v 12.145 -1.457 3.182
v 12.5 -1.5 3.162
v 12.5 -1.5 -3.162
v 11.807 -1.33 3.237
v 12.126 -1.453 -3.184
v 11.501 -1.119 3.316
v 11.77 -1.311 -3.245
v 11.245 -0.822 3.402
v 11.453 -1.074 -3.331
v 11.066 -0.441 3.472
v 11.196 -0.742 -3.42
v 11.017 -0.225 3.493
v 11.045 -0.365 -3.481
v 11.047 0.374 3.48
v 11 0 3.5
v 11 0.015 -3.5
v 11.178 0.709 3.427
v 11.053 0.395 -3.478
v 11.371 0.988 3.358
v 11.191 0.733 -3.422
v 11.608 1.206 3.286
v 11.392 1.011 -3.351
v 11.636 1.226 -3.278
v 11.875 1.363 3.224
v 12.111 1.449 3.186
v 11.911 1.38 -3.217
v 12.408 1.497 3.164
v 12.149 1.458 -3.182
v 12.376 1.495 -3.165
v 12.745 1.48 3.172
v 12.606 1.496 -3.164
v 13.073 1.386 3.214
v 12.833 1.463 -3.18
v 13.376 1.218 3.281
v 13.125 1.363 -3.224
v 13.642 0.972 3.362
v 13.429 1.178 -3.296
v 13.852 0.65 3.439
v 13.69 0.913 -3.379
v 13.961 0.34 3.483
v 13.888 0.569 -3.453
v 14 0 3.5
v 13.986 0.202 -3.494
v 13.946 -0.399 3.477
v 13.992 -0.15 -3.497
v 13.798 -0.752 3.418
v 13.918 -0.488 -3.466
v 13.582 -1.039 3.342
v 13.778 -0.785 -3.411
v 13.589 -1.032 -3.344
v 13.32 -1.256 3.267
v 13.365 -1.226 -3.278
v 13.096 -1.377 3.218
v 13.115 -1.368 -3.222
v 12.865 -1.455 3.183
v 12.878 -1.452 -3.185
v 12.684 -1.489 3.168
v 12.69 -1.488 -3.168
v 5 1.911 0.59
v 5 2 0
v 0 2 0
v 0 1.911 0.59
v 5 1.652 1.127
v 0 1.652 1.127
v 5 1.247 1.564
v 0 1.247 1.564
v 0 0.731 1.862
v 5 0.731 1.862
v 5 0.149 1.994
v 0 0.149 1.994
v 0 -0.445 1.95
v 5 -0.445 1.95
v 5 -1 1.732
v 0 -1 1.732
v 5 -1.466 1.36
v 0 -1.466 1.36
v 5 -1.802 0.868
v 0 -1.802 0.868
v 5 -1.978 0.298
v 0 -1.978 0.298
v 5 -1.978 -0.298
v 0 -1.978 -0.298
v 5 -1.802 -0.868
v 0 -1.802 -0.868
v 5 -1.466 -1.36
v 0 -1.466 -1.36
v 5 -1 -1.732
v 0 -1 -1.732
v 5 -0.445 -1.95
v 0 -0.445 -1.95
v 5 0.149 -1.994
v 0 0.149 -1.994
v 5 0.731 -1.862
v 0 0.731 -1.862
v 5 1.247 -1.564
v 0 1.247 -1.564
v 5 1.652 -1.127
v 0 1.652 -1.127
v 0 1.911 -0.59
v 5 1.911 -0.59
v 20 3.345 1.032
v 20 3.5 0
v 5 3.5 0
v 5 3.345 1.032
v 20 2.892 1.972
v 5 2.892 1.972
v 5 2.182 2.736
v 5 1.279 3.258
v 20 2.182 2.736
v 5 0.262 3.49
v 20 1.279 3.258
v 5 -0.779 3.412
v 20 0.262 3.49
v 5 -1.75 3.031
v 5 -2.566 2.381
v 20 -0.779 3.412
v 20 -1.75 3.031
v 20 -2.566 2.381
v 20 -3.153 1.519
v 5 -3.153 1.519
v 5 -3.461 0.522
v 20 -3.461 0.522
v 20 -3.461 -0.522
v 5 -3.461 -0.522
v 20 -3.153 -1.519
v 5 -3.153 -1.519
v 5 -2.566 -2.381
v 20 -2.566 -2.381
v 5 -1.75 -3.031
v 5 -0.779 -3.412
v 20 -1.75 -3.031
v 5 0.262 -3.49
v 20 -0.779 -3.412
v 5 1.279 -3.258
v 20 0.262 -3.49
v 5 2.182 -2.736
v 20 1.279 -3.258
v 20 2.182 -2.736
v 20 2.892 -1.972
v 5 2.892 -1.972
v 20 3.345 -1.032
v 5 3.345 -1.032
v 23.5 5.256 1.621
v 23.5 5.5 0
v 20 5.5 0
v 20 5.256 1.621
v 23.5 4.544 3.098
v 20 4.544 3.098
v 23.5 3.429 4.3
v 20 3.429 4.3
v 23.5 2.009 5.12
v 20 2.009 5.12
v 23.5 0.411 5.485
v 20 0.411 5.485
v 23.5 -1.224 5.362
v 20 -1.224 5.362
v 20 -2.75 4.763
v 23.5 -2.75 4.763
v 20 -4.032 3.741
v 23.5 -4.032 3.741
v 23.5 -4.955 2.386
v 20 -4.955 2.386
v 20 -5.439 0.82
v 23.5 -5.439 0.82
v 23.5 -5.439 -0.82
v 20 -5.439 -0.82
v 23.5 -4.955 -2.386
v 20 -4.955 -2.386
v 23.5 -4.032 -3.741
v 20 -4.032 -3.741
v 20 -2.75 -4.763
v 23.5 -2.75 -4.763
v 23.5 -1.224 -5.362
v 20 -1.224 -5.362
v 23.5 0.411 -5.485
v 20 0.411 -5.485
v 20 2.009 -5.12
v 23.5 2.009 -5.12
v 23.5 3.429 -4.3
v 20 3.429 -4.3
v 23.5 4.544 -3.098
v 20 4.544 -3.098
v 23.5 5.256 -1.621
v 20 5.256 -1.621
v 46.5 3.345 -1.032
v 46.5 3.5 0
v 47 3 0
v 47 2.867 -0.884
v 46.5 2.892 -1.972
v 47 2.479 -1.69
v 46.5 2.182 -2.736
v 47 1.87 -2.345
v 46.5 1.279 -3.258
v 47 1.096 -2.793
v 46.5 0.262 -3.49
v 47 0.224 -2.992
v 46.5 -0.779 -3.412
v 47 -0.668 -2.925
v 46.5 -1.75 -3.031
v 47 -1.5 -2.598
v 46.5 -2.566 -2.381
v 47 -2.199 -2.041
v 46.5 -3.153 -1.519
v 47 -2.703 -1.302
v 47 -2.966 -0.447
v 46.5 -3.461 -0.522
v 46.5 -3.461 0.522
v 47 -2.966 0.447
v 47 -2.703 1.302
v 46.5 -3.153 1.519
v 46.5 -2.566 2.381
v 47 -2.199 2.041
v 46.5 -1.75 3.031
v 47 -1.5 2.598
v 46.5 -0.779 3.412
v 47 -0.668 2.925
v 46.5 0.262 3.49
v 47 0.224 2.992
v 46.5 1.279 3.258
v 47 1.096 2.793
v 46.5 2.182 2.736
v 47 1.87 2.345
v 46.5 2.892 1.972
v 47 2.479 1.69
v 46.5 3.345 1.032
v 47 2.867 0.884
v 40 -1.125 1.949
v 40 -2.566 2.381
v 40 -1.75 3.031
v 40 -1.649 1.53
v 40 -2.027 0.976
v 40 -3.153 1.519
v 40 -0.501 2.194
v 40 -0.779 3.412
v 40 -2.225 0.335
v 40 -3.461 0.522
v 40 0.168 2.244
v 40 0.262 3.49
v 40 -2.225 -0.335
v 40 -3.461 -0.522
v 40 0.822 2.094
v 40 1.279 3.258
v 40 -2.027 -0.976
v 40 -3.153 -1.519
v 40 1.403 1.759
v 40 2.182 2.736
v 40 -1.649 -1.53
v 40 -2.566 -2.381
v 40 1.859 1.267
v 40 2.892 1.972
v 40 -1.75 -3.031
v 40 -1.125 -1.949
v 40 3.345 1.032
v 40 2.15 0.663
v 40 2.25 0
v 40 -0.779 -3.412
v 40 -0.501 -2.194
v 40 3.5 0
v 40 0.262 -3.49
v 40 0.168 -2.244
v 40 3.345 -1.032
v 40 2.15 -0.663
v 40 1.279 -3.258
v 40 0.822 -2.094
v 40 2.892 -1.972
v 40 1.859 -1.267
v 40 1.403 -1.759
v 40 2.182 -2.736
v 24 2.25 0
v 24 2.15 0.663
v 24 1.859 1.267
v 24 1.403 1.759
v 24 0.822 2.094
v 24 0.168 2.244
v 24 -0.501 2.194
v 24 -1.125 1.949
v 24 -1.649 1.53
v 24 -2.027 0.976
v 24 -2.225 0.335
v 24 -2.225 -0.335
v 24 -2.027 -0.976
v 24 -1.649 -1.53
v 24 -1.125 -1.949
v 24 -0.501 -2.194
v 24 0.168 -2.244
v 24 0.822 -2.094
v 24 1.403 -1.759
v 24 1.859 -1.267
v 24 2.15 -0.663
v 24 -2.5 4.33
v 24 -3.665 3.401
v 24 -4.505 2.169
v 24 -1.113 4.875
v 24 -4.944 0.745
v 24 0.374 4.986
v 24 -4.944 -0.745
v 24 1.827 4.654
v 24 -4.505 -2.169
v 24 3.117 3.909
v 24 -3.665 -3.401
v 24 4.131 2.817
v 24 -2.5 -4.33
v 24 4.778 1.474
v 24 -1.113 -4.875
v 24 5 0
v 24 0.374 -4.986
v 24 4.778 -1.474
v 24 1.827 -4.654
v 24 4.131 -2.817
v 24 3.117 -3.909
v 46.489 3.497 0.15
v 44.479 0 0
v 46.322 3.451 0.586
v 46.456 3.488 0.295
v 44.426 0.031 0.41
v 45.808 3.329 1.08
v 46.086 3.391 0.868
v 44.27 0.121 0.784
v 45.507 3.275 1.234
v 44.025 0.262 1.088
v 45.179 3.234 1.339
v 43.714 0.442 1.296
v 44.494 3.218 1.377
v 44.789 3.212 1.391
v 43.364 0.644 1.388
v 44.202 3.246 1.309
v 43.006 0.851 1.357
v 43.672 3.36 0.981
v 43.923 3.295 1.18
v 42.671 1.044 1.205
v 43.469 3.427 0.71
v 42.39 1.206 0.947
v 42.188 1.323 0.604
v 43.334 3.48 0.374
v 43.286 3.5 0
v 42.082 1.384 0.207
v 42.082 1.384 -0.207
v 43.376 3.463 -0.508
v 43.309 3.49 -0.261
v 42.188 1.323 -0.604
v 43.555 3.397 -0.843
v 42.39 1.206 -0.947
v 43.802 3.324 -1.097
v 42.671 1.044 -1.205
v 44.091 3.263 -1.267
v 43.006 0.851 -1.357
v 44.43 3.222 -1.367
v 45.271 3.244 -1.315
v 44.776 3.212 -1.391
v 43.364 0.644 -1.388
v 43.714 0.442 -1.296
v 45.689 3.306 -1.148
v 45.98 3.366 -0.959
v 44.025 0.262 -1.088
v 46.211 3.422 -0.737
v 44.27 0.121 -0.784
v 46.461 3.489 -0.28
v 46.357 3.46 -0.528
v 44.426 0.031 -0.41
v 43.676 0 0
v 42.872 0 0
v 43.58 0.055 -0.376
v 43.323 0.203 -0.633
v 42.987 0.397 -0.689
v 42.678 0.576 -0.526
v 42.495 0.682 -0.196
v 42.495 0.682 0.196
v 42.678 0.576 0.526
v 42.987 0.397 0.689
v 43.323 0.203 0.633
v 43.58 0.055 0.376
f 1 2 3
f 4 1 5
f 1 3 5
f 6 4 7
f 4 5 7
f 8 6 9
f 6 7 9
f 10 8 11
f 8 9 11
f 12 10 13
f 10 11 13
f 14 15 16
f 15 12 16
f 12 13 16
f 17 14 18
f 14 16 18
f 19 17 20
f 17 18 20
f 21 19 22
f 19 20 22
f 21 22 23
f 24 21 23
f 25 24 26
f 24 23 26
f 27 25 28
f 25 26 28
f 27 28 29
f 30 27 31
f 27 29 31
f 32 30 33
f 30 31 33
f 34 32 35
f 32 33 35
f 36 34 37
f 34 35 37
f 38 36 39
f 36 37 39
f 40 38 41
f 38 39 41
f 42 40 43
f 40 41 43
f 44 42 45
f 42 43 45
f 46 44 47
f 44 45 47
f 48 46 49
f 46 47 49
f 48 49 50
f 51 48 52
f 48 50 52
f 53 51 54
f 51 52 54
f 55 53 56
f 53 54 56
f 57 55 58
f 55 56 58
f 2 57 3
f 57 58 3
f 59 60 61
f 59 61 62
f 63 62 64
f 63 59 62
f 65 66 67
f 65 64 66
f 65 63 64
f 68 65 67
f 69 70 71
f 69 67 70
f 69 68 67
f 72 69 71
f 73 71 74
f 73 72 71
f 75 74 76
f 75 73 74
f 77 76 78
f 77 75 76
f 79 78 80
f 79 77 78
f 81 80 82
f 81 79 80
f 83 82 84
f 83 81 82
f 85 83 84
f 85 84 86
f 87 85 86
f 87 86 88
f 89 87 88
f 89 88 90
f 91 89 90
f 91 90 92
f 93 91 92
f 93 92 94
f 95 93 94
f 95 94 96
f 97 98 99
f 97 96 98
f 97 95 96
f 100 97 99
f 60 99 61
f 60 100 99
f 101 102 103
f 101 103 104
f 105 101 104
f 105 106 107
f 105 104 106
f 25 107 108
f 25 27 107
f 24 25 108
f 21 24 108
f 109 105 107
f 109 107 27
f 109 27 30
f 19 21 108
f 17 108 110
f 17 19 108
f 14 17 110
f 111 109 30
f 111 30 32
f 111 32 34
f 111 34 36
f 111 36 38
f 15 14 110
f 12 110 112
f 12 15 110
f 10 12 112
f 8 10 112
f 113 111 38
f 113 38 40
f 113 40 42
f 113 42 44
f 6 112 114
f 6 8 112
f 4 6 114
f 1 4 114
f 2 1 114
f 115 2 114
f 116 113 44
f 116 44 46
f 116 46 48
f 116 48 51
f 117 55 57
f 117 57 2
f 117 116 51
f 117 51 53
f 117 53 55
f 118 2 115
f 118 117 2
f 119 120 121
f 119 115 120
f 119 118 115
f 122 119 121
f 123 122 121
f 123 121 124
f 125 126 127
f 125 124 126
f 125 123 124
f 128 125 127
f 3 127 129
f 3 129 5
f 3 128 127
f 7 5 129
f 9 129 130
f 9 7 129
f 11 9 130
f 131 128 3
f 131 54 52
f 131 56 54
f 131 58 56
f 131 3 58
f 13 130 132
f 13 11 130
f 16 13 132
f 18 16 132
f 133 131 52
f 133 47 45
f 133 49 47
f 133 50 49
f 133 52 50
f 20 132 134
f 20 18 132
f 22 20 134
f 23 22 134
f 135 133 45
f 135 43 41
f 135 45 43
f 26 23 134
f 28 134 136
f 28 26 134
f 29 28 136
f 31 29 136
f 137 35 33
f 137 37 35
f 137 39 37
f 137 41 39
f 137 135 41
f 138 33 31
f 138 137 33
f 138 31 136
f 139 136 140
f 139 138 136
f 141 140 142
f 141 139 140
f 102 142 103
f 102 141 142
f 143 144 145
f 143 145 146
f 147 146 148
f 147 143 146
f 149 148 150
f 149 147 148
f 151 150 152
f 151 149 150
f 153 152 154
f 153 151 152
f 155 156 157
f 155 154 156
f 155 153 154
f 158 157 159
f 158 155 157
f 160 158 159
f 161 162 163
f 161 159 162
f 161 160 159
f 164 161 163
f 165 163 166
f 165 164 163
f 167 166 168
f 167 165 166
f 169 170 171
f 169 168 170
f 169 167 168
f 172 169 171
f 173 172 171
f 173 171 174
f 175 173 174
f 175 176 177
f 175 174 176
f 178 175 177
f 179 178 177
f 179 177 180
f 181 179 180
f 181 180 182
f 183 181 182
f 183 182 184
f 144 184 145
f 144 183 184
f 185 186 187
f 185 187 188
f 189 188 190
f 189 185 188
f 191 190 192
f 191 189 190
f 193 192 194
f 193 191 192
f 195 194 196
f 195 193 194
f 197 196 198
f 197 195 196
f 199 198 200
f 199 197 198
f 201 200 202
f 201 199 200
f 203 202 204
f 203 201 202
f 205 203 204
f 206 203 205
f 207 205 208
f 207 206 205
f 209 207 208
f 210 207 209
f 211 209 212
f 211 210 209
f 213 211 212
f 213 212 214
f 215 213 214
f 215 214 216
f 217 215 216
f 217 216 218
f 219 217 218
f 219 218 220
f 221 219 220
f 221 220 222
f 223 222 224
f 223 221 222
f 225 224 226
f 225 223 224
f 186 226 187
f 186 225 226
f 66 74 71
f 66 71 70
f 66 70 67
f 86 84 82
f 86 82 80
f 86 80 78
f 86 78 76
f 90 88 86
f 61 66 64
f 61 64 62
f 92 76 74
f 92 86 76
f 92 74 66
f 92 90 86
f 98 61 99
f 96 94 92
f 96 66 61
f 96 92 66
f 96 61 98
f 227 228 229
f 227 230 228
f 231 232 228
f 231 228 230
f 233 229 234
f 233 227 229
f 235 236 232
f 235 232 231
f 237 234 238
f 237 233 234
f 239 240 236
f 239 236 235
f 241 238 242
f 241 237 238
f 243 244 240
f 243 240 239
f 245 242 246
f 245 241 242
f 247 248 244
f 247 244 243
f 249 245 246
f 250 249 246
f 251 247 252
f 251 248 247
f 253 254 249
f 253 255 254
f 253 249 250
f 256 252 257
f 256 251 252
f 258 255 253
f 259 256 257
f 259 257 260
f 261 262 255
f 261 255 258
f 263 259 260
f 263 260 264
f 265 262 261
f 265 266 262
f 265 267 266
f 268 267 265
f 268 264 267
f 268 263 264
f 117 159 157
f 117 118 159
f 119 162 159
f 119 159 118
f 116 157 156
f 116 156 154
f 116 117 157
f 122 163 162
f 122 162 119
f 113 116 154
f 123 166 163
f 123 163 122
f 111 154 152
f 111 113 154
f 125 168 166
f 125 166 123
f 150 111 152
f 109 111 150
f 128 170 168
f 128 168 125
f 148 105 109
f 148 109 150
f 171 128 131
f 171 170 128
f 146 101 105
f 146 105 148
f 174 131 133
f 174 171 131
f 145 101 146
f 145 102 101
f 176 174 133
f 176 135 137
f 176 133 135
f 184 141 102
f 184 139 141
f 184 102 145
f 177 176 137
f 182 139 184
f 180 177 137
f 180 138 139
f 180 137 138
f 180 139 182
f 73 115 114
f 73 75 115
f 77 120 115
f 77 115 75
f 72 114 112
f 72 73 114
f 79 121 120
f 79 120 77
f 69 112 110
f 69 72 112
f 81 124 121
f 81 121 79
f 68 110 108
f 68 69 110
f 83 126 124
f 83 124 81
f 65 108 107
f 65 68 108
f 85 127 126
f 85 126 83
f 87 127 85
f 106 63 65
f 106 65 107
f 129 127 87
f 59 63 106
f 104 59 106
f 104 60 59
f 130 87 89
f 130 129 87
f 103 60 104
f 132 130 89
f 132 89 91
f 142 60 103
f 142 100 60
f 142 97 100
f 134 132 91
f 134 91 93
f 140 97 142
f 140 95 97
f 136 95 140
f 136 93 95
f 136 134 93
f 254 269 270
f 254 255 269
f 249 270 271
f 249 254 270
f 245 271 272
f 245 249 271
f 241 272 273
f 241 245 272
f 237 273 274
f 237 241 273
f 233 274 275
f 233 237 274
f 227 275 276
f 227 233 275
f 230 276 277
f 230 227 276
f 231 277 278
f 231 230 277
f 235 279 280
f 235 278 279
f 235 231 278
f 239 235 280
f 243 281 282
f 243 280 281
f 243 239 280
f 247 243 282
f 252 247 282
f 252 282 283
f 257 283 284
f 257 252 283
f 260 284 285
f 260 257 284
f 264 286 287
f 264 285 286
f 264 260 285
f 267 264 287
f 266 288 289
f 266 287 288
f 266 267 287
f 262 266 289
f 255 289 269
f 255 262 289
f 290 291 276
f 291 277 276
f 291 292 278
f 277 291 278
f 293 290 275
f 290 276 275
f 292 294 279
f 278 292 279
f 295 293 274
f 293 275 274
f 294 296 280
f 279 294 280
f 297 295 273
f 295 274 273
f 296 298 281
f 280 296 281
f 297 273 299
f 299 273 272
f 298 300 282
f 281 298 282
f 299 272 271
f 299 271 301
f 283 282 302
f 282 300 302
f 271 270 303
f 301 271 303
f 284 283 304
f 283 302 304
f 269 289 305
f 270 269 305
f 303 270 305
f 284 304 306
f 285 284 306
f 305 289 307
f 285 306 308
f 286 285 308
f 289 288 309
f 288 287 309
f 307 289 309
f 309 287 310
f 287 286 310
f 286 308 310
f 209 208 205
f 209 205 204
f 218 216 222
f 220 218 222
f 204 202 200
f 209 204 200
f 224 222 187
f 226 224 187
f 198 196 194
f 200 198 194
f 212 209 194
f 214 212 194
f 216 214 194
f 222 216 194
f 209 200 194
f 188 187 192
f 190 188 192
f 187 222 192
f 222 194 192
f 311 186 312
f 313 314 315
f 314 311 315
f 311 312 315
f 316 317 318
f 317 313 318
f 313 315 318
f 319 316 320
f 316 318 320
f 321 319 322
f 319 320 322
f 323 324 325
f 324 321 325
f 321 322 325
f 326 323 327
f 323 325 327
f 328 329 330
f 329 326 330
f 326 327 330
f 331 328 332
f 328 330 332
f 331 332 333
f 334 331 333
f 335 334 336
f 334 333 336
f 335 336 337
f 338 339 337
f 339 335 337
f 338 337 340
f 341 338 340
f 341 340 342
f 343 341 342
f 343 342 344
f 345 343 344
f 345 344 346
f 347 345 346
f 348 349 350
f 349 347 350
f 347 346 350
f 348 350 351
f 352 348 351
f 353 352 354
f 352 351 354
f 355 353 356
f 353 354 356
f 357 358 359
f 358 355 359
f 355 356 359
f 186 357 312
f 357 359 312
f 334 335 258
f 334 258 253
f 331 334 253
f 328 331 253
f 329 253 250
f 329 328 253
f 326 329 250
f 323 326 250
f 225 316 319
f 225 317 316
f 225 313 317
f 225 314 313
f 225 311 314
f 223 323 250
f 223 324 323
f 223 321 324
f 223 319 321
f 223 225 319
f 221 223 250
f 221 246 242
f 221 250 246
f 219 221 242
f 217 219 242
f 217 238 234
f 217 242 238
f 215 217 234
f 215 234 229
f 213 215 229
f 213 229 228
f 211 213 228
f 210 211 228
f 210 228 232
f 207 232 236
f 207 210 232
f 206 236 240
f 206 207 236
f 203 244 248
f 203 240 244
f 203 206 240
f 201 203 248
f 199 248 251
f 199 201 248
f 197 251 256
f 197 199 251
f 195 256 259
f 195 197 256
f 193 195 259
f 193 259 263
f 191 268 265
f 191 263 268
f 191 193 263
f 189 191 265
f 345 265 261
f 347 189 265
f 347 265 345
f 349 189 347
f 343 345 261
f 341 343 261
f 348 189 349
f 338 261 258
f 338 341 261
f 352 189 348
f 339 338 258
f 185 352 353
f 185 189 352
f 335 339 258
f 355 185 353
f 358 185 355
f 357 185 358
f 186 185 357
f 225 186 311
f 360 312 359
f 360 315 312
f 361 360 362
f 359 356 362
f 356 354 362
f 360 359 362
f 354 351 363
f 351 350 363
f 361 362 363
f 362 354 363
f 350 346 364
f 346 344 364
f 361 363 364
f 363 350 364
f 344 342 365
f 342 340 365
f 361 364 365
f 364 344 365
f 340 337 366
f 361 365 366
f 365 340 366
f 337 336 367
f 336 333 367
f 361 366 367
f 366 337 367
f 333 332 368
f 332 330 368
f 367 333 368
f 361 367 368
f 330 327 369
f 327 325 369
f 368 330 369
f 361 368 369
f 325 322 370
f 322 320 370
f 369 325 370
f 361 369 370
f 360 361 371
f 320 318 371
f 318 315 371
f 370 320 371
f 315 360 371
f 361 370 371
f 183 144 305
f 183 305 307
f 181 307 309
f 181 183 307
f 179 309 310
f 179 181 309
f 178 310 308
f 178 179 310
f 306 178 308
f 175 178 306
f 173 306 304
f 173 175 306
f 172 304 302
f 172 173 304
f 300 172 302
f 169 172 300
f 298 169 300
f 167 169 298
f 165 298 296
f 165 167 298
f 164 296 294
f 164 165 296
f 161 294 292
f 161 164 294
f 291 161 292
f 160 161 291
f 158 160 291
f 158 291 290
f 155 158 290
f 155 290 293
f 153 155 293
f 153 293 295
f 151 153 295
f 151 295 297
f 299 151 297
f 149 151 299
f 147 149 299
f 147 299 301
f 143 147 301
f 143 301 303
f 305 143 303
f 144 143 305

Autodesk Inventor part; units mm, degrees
ref_plane "YZ Plane" through (0, 0, 0) normal (1, 0, 0) x (0, 1, 0)
ref_plane "XZ Plane" through (0, 0, 0) normal (0, 1, 0) x (-1, 0, 0)
sketch "Sketch1" plane through (0, 0, 0) normal (0, 0, 1) x (1, 0, 0)
  line L0 (0, 0) -> (0, 2)
  line L1 (0, 2) -> (5, 2)
  line L2 (5, 2) -> (5, 3.5)
  line L3 (5, 3.5) -> (20, 3.5)
  line L4 (20, 3.5) -> (20, 5.5)
  line L5 (20, 5.5) -> (21.4643, 5.5)
  line L6 (21.4643, 5.5) -> (21.4643, 5.5)
  line L7 (21.4643, 5.5) -> (24, 5.5)
  line L8 (24, 5.5) -> (24, 2.25)
  line L9 (24, 2.25) -> (40, 2.25)
  line L10 (40, 2.25) -> (40, 3.5)
  line L11 (40, 3.5) -> (47, 3.5)
  line L12 (47, 3.5) -> (47, 0)
  line L13 (47, 0) -> (0, 0)
  dimension "d0" = 4
  dimension "d1" = 7
  dimension "d2" = 5
  dimension "d3" = 15
  dimension "d4" = 47
  dimension "d5" = 7
  dimension "d6" = 16
  dimension "d7" = 4.5
  dimension "d8" = 4
  dimension "d10" = 11
revolve "Revolution1" add sketch "Sketch1" angle 360 about axis through (47, 0, 0) along (-1, 0, 0)
thread "Thread1" size "M4x0.7" class "6g" standard "ISO Metric profile" length 10
chamfer "Chamfer1" distance 0.5 angle 45 2 edges at (24, -5.5, 0) (47, -3.5, 0)
ref_plane "Work Plane1" through (0, 0, 3.5) normal (0, 0, 1) x (1, 0, 0)
sketch "Sketch2" plane through (0, 0, 3.5) normal (0, 0, 1) x (1, 0, 0)
  line L0 (5, 3.5) -> (5, -3.5) projected
  point P0 (0, 0)
  point P1 (12.5, 0)
  dimension "d18" = 7.5
hole "Hole1" at (12.5, 0, 3.5) direction (0, 0, -1) diameter 3 end through all
sketch "Sketch4" plane through (0, 0, 0) normal (0, 0, 1) x (1, 0, 0)
  line L0 (44.893, 3.5) -> (42.8722, 0)
  line L1 (46.5, 3.5) -> (44.893, 3.5)
  line L2 (47, 3) -> (47, -3) projected
  line L3 (46.5, 3.5) -> (40, 3.5) projected
  line L4 (46.5, -3.5) -> (46.5, 3.5) projected
  line L5 (46.5, 3.5) -> (44.4793, 0)
  line L6 (44.4793, 0) -> (42.8722, 0)
  point P0 (0, 0)
  point P1 (44.4443, 0)
  point P2 (47, 0)
  point P3 (46.5, 0)
  dimension "d38" = 30
revolve "Revolution3" cut sketch "Sketch4" angle 360 about axis through (44.893, 3.5, 0) along (0.5, 0.8660254, 0)
properties part number "151"
